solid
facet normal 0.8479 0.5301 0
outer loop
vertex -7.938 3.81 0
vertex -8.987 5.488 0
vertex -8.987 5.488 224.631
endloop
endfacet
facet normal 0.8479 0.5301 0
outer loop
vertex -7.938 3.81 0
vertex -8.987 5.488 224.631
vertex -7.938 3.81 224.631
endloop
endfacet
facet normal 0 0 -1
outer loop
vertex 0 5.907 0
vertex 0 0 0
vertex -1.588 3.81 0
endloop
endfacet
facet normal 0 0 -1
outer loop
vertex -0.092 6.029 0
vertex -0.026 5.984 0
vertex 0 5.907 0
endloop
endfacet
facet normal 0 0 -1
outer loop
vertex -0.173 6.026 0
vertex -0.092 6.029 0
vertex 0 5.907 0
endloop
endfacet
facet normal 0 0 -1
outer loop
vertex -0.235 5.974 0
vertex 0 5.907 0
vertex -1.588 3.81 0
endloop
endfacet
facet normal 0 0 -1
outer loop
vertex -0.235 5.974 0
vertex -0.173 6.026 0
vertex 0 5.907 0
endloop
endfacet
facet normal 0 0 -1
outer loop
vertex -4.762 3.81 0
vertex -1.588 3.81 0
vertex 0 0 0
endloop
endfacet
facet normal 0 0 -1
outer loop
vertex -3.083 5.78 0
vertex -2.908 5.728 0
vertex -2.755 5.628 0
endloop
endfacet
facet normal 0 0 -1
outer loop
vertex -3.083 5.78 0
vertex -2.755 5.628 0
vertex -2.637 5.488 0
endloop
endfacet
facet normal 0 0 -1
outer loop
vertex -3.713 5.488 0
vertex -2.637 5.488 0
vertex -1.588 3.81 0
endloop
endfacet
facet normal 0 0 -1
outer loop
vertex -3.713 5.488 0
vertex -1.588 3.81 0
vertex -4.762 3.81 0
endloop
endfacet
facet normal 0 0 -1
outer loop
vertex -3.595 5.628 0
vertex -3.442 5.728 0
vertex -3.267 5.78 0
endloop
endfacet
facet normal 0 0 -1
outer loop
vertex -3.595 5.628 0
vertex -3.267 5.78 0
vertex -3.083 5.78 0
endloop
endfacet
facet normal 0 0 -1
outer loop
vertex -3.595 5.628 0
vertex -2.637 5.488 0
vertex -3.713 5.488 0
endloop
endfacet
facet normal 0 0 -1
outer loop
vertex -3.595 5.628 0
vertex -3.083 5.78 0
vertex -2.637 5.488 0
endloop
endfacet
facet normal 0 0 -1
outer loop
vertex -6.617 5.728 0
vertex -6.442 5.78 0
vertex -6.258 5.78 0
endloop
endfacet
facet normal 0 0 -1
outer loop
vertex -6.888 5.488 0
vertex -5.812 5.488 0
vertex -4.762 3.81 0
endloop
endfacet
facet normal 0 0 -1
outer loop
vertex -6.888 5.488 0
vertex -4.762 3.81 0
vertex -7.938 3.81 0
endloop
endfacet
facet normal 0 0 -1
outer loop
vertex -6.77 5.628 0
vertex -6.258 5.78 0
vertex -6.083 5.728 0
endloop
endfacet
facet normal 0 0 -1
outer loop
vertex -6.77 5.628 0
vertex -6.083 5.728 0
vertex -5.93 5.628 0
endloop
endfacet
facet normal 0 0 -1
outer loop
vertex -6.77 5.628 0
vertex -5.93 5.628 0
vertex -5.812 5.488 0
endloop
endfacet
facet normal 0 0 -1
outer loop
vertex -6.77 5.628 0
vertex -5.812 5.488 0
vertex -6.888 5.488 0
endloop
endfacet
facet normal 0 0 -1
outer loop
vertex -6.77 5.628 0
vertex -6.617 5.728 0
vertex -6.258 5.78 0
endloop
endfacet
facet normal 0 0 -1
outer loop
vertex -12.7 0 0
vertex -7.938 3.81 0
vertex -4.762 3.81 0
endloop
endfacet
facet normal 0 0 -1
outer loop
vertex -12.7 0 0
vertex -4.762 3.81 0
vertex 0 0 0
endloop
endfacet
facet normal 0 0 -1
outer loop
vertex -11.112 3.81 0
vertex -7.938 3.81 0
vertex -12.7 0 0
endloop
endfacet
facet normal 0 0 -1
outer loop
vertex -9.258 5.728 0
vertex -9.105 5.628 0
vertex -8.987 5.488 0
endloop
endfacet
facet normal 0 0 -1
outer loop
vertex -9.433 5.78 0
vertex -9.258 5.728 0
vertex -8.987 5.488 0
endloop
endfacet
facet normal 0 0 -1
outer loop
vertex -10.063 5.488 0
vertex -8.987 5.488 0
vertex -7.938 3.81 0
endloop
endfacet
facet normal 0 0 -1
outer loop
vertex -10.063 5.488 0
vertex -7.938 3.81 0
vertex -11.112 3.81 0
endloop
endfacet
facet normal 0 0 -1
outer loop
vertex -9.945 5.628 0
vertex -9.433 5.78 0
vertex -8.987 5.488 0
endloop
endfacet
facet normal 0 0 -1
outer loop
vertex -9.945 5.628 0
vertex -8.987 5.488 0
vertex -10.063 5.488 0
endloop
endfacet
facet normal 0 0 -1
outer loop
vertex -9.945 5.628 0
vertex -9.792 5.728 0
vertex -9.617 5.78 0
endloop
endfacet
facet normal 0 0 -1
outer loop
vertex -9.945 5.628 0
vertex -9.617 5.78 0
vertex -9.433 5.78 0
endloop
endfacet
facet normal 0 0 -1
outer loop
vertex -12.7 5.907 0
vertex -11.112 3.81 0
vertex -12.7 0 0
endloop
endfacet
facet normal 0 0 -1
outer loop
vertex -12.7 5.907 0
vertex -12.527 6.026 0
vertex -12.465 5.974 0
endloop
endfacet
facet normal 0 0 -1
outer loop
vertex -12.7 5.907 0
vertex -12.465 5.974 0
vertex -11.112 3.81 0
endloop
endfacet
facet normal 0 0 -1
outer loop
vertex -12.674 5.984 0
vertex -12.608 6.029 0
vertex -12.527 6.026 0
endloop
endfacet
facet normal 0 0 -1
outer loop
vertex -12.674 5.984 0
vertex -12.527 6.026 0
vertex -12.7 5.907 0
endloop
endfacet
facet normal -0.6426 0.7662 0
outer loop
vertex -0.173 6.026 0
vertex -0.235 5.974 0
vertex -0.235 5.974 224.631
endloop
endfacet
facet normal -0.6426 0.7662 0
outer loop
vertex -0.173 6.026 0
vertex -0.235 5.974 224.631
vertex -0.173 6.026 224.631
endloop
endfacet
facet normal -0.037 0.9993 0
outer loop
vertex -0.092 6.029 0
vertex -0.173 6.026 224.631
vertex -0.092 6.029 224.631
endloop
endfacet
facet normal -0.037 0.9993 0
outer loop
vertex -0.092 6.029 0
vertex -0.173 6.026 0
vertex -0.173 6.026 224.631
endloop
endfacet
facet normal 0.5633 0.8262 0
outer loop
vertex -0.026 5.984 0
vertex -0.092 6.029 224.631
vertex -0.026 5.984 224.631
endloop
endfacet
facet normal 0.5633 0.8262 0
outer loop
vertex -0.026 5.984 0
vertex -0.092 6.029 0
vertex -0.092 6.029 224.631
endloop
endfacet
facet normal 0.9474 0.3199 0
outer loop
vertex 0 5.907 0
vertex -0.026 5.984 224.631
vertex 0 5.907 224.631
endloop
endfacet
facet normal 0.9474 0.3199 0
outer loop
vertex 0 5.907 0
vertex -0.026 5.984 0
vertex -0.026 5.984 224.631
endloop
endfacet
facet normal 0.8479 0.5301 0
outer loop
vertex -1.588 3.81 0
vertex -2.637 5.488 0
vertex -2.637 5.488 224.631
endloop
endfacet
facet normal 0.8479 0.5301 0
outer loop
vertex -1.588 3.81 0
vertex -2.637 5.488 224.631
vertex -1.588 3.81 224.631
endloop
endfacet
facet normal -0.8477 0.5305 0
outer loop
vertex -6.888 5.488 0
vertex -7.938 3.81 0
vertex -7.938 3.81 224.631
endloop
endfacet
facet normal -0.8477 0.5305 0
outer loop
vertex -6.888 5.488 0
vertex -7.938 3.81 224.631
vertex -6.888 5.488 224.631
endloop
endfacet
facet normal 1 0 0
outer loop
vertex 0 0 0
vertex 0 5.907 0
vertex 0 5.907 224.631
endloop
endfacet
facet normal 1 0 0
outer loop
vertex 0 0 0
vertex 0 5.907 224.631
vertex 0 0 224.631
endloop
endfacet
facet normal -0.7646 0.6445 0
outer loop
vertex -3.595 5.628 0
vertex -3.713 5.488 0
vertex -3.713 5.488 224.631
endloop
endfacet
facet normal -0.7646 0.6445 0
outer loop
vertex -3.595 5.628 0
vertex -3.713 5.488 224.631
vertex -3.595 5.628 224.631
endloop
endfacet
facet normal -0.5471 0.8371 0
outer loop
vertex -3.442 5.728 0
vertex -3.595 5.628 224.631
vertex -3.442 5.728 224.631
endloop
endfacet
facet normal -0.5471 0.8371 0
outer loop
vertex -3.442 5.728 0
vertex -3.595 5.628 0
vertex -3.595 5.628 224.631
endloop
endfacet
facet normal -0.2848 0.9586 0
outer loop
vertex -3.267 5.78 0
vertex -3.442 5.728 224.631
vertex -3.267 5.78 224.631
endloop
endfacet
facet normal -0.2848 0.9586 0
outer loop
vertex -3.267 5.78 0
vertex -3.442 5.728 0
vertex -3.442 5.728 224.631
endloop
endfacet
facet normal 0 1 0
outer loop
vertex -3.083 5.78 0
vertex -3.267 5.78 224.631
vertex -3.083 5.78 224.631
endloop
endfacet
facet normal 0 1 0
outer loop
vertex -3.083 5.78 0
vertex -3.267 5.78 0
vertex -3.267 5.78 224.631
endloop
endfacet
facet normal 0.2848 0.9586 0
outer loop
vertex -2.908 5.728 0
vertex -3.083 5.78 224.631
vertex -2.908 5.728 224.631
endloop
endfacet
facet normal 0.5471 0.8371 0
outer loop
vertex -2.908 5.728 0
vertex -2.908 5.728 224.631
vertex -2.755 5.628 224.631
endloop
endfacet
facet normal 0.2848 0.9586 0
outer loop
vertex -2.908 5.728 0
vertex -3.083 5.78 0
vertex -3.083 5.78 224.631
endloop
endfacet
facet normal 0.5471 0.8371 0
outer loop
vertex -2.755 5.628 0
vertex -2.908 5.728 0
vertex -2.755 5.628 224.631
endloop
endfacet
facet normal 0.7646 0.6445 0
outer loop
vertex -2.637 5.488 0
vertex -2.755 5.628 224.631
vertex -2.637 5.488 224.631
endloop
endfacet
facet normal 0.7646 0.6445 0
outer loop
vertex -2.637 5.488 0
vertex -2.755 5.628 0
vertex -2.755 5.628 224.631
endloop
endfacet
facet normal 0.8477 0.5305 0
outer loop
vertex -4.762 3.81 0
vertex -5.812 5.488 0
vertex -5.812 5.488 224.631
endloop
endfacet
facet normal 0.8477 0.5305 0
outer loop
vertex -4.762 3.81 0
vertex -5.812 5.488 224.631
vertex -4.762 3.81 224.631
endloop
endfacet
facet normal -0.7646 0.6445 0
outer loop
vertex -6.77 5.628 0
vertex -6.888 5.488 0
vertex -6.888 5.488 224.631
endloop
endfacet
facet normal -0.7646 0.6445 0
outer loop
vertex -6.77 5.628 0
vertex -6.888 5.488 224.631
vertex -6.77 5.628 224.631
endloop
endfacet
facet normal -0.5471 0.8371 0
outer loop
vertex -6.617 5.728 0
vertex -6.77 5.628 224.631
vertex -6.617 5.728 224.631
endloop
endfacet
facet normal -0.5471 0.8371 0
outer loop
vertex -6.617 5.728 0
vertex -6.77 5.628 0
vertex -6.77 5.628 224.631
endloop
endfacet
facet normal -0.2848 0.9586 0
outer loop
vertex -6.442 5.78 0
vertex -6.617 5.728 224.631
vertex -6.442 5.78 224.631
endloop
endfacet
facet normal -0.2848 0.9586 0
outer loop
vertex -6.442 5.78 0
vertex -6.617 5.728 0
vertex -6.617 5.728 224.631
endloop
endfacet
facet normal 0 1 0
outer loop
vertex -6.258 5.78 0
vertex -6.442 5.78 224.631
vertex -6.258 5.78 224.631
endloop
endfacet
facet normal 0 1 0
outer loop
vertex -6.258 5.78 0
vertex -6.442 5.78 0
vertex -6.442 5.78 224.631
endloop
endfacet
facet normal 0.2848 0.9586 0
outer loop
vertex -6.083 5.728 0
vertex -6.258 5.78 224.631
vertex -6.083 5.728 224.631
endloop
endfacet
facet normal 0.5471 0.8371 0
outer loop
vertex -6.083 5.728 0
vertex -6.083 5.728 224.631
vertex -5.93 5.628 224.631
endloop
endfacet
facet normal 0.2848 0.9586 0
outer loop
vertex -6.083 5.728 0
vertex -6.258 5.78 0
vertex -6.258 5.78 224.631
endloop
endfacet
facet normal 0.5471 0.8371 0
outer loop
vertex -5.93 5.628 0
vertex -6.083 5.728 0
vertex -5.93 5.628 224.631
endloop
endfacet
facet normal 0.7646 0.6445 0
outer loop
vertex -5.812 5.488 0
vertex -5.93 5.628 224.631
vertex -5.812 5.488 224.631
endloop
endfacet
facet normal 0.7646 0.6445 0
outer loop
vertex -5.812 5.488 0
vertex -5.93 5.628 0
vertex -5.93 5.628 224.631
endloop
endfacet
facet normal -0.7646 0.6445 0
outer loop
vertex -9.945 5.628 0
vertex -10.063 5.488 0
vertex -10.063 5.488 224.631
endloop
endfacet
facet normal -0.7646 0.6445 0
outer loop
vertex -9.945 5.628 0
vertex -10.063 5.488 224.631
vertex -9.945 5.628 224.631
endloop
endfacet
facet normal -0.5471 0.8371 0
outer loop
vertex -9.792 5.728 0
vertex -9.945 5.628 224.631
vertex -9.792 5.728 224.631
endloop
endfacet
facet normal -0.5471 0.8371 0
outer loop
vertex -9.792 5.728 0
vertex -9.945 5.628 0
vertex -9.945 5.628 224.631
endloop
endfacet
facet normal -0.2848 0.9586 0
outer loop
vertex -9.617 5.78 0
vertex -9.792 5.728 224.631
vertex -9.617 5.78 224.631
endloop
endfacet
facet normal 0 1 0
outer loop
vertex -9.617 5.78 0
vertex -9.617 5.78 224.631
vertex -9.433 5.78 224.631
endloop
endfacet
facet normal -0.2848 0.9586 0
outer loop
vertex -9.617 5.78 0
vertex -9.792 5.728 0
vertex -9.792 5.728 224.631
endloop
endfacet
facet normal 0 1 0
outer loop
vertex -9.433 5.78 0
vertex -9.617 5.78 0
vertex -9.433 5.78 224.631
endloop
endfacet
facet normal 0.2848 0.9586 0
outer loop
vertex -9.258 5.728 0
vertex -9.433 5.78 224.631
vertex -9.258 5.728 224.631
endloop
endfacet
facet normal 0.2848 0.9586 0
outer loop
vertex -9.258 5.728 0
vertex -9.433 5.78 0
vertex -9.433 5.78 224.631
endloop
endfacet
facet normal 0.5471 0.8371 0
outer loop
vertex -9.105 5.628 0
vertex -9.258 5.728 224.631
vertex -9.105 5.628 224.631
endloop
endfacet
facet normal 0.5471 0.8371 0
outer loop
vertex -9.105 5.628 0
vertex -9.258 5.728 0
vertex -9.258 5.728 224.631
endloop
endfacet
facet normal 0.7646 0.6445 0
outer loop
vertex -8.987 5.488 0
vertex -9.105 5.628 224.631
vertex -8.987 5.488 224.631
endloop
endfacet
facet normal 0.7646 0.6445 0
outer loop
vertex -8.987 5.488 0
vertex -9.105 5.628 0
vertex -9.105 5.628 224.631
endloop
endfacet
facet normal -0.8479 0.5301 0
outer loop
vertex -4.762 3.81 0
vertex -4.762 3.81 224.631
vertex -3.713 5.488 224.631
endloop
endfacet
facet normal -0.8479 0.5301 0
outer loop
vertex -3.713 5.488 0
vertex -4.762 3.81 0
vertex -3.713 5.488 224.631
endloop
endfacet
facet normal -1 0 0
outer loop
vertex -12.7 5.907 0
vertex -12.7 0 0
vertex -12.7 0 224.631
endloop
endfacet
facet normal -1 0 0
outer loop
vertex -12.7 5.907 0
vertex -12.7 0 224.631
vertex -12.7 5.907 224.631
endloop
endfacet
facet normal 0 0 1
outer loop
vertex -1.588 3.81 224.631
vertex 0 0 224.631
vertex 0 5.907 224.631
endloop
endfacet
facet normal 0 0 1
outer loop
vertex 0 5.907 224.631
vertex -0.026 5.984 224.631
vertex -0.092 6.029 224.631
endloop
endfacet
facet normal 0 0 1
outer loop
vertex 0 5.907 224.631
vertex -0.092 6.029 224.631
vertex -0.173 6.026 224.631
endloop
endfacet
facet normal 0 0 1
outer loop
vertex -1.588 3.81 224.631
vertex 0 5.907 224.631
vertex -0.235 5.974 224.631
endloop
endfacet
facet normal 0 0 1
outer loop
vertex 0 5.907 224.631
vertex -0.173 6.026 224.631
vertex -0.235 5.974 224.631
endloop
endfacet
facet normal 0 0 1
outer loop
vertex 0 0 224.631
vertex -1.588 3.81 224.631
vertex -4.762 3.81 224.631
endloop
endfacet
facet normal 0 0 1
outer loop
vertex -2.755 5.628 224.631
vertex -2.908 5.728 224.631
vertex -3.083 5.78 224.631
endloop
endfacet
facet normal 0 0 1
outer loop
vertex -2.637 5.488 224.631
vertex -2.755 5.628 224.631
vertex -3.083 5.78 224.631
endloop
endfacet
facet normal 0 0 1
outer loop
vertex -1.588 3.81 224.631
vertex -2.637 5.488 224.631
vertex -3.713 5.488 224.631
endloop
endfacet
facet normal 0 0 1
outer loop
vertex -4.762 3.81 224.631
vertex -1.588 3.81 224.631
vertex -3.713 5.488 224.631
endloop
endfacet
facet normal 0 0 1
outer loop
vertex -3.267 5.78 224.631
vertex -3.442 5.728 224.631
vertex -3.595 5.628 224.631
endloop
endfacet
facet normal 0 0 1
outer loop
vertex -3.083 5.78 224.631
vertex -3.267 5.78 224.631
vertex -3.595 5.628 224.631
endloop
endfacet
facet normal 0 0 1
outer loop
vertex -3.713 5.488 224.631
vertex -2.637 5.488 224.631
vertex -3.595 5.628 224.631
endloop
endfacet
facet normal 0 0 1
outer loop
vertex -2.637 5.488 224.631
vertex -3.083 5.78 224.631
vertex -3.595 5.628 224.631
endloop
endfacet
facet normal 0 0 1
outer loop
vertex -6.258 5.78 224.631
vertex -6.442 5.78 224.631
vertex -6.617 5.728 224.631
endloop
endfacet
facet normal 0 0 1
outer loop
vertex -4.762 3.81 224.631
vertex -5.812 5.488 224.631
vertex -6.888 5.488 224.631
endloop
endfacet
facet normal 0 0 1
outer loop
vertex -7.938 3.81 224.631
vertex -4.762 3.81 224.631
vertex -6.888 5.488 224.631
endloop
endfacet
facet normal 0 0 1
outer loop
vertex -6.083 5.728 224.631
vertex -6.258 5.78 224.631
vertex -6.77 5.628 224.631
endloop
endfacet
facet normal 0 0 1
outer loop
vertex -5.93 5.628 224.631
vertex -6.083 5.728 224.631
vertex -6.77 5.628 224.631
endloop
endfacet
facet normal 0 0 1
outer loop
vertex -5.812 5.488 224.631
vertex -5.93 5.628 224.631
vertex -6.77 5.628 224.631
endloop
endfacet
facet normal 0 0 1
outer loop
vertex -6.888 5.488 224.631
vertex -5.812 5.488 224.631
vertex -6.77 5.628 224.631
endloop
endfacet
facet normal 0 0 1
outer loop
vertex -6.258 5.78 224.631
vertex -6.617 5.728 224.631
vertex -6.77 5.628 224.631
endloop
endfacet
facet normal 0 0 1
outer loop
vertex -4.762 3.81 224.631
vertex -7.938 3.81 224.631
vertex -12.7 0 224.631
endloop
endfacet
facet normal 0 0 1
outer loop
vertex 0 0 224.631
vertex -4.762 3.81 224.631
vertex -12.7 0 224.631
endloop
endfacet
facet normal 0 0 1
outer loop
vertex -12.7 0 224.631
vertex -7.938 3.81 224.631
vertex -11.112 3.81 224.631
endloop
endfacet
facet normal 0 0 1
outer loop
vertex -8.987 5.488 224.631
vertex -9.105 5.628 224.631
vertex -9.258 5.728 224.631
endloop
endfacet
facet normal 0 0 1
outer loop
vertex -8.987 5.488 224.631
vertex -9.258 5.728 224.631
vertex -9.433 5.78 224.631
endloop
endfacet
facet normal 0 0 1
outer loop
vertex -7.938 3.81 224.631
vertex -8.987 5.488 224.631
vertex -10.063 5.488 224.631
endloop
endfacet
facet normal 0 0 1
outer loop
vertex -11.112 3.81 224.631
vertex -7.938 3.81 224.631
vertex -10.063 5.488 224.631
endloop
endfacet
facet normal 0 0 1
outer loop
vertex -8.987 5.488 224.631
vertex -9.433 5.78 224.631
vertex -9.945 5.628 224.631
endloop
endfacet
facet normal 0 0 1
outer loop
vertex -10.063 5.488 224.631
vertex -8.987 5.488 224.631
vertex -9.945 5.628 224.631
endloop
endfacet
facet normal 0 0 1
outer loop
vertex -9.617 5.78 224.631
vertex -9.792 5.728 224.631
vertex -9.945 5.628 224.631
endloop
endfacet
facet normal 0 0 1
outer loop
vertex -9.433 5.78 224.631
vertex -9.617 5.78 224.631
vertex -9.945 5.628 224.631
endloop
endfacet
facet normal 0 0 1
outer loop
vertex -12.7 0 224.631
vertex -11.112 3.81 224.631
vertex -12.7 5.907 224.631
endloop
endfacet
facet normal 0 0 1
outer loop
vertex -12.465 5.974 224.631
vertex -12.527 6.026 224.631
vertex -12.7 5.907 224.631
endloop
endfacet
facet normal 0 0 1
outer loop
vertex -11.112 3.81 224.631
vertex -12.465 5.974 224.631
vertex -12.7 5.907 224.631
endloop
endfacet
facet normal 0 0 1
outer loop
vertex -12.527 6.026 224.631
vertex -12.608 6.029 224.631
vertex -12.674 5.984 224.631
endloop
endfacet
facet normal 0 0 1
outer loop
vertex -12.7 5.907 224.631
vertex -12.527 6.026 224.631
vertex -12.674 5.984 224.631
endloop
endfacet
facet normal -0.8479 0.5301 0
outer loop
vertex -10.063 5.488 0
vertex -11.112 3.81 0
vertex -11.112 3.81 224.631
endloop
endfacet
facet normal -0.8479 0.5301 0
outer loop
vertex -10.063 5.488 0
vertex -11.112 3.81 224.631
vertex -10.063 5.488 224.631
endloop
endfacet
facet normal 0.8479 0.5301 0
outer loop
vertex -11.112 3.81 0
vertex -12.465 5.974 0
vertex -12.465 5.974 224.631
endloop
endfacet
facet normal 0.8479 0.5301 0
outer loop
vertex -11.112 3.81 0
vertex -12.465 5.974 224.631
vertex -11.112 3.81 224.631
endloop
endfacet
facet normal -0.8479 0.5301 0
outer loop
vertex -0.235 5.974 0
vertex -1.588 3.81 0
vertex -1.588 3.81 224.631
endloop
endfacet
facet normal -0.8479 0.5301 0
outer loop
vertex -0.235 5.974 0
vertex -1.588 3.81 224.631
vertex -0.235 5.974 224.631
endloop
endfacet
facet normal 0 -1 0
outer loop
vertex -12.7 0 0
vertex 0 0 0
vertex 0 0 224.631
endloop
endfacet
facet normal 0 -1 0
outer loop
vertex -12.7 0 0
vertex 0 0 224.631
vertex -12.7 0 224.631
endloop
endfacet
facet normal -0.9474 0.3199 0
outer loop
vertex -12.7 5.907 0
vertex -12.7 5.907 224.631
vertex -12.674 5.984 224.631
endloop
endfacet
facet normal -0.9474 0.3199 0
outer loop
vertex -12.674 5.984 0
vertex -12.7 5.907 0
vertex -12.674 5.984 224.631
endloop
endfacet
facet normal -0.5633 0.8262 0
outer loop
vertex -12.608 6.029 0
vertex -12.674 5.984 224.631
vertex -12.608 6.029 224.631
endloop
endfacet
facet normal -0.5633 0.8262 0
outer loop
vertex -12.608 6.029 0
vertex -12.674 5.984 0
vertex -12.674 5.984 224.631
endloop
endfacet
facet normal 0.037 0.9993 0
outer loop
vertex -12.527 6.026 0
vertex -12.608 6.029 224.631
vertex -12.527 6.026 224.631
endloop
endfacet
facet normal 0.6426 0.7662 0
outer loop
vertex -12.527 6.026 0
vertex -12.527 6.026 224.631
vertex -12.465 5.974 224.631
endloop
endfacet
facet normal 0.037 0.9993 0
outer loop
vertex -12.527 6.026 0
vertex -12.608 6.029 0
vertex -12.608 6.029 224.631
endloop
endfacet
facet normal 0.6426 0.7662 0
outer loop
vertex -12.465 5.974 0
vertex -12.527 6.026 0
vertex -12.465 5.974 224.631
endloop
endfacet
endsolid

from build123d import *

# Parameters (mm, degrees)
BOSS_EXTRUDE1_DEPTH = 224.63125


with BuildPart() as part:
    # Sketch1 → Boss-Extrude1 (new body)
    with BuildSketch(Plane.XY):
        with BuildLine():
            Line((0, 0), (-12.7, 0))
            Line((-12.7, 0), (-12.7, 5.907176879))
            ThreePointArc((-12.7, 5.907176879), (-12.608011679, 6.02925547), (-12.465304215, 5.974486745))
            Line((-12.465304215, 5.974486745), (-11.1125, 3.81))
            Line((-11.1125, 3.81), (-10.063478923, 5.488433723))
            ThreePointArc((-10.063478923, 5.488433723), (-9.525, 5.786884396), (-8.986521077, 5.488433723))
            Line((-8.986521077, 5.488433723), (-7.9375, 3.81))
            Line((-7.9375, 3.81), (-6.888478923, 5.488433723))
            ThreePointArc((-6.888478923, 5.488433723), (-6.35, 5.786884396), (-5.811521077, 5.488433723))
            Line((-5.811521077, 5.488433723), (-4.7625, 3.81))
            Line((-4.7625, 3.81), (-3.713478923, 5.488433723))
            ThreePointArc((-3.713478923, 5.488433723), (-3.175, 5.786884396), (-2.636521077, 5.488433723))
            Line((-2.636521077, 5.488433723), (-1.5875, 3.81))
            Line((-1.5875, 3.81), (-0.234695785, 5.974486745))
            ThreePointArc((-0.234695785, 5.974486745), (-0.091988321, 6.02925547), (0, 5.907176879))
            Line((0, 5.907176879), (0, 0))
        make_face()
    extrude(amount=BOSS_EXTRUDE1_DEPTH)


solid = part.part
